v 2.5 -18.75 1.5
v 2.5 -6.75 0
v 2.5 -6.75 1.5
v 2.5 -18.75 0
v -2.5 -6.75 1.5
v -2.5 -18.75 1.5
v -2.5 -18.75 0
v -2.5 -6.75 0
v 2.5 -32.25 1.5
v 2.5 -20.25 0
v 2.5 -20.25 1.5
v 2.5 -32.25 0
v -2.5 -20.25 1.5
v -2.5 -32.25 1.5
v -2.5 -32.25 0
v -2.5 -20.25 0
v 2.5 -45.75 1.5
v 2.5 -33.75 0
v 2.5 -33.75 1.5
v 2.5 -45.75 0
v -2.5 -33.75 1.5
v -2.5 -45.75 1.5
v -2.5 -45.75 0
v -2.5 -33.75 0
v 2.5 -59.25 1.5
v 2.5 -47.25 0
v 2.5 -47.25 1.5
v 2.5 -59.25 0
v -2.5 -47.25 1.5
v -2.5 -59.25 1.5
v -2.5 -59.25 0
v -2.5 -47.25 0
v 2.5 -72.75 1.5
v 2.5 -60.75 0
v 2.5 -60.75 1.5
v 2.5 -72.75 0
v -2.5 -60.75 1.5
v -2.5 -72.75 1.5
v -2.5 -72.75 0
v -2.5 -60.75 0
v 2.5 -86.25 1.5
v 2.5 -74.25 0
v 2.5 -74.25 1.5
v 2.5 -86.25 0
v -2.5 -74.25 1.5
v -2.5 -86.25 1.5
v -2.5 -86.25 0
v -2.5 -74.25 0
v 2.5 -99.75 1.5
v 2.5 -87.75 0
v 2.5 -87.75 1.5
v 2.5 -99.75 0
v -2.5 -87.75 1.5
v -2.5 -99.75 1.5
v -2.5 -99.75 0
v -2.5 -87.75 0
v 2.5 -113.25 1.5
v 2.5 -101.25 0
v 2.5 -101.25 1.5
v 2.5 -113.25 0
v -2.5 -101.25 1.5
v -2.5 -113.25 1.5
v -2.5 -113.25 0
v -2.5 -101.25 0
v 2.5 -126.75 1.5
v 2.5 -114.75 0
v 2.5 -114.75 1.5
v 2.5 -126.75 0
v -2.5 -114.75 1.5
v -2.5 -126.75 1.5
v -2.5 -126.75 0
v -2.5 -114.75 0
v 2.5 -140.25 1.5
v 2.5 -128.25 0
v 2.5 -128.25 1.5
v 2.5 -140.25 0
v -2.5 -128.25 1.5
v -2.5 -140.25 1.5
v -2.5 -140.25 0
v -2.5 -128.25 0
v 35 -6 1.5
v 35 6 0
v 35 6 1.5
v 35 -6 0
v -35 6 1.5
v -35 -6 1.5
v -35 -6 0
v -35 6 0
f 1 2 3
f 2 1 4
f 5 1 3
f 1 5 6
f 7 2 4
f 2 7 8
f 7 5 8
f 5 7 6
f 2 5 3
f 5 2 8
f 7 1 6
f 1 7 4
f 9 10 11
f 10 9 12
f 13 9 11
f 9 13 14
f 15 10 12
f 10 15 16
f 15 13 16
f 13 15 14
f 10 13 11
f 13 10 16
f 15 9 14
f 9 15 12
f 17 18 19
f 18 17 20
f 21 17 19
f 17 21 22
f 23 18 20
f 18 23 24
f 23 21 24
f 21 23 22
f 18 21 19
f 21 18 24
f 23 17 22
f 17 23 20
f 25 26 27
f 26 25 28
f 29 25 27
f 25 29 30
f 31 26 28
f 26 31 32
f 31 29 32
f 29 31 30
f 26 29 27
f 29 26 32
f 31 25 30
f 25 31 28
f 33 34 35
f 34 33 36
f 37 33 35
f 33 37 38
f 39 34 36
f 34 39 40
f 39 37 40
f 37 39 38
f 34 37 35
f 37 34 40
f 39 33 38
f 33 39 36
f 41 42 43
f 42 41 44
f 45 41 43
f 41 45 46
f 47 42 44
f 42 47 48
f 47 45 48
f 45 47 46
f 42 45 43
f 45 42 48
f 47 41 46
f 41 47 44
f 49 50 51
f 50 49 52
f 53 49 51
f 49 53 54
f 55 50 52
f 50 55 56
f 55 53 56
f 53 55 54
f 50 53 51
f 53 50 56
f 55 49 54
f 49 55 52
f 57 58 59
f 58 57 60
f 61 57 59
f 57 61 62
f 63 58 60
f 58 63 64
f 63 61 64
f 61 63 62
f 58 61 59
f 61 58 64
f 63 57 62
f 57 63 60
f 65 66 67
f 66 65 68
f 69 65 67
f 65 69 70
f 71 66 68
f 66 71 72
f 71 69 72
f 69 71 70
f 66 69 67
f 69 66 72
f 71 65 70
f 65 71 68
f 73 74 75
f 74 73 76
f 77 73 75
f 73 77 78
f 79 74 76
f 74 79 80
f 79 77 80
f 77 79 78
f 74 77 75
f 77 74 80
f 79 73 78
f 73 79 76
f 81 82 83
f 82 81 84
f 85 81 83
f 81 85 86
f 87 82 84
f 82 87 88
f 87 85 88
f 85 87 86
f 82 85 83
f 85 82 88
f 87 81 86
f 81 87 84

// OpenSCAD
// Dimensions for 10-well agarose gel comb
$fn = 64;

// Spine (back bar) dimensions
spine_length = 70;   // X direction
spine_width = 12;    // Y direction
spine_thickness = 1.5; // Z direction (height)

// Tooth dimensions
tooth_width = 5.0;   // X direction (width of each tooth)
tooth_length = 12;     // Y direction (length of each tooth, extending from spine)
tooth_gap = 1.5;      // Gap between adjacent teeth (in Y direction)

// Number of teeth
num_teeth = 10;

// The spine is centered at (0, 0, 0) and lies on the bed (z = 0)
// The tooth row is attached to the spine's -Y edge (Y = -spine_width/2 = -6 mm)
// The tooth row extends in the -Y direction from that edge

// Total Y span of the tooth row: 10 teeth × 12 mm + 9 gaps × 1.5 mm = 120 + 13.5 = 133.5 mm
// So the tooth row extends from Y = -6 - 133.5 = -139.5 mm to Y = -6 mm

// The spine is 70 mm long in X, so we center the tooth row in X over the spine
// Each tooth is 5.0 mm wide in X, so we center each tooth at X = 0

// The tooth row is centered in X, so the X center of each tooth is 0
// The Y center of the first tooth is at Y = -6 - tooth_length/2 - tooth_gap/2 = -6 - 6 - 0.75 = -12.75

// But we can compute the Y position of each tooth's center as:
// Y_center = -spine_width/2 - tooth_length/2 - tooth_gap/2 - (tooth_length + tooth_gap) * i

// However, we must ensure the entire comb is properly positioned so that the spine is at z = 0 and the part lies flat on the bed

// The spine is 1.5 mm thick, so we place it at z = 0 to z = 1.5, but the bed is at z = 0
// So we need to ensure the lowest point is at z = 0

// The spine is centered at z = 0, so its bottom is at z = -0.75, top at z = 0.75
// But the bed is at z = 0, so the part is floating — we need to shift it so that the bottom is at z = 0

// Therefore, we translate the entire comb by +0.75 in Z

// Now, the spine will go from z = 0 to z = 1.5, and the comb lies flat on the bed

// Build the comb: start with the spine centered at (0, 0, 0), then shift it up by 0.75 in Z

module comb() {
    // Spine (back bar) — centered at (0, 0, 0), then shifted up
    translate([0, 0, 0.75])
        cube([spine_length, spine_width, spine_thickness], center = true);

    // Add teeth using a loop
    for (i = [0 : num_teeth - 1]) {
        // Y position of this tooth's center
        // The first tooth starts at Y = -spine_width/2 - tooth_length/2 - tooth_gap/2
        // Then each next tooth is offset by (tooth_length + tooth_gap) in Y
        // But we want to center the tooth row in X over the spine
        // So each tooth is centered at X = 0
        // Y center = -spine_width/2 - tooth_length/2 - tooth_gap/2 - (tooth_length + tooth_gap) * i

        // However, the spine is 70 mm long in X, and the tooth is 5.0 mm wide in X
        // So to center the tooth in X, we place it at X = 0
        // But the spine's X is from -35 to 35, so we need to ensure the tooth is within that

        // The tooth is 5.0 mm wide in X, so we center it at X = 0
        // The Y center of the tooth is:
        // Y_center = -spine_width/2 - tooth_length/2 - tooth_gap/2 - (tooth_length + tooth_gap) * i

        // But this would make the tooth row extend from Y = -6 - 6 - 0.75 = -12.75 for the first tooth
        // Then next at Y = -12.75 - (12 + 1.5) = -12.75 - 13.5 = -26.25

        // But the total Y span should be 133.5 mm, so the last tooth should be at Y = -12.75 - 13.5 * 9 = -12.75 - 121.5 = -134.25

        // That matches the report: Y: -134.25 .. 6.00

        // So the Y center of the first tooth is at Y = -6 - 6 - 0.75 = -12.75
        // But we can compute it as:
        // Y_center = -spine_width/2 - tooth_length/2 - tooth_gap/2 - (tooth_length + tooth_gap) * i

        // Actually, we can simplify: the first tooth's Y center is at Y = -spine_width/2 - tooth_length/2 - tooth_gap/2
        // Then subtract (tooth_length + tooth_gap) * i

        // But we can also think: the tooth row is symmetric in X, so we place each tooth centered at X = 0

        // So:
        // X: 0 (centered)
        // Y: -spine_width/2 - tooth_length/2 - tooth_gap/2 - (tooth_length + tooth_gap) * i
        // Z: 0.75 (to lift the bottom to z = 0)

        // But we can do it in one translate

        // Calculate Y center for this tooth
        tooth_y_center = -spine_width/2 - tooth_length/2 - tooth_gap/2 - (tooth_length + tooth_gap) * i;

        // X center is 0 (centered over spine)
        // Z is 0.75 (to lift the bottom to z = 0)

        // But the tooth is 5.0 mm wide in X, so we need to center it at X = 0
        // So we translate to (0, tooth_y_center, 0.75)

        // However, the tooth is 5.0 mm wide in X, so we need to place it so that it's centered at X = 0
        // So we use:
        // translate([0, tooth_y_center, 0.75])
        //   cube([tooth_width, tooth_length, spine_thickness], center = true);

        // But the tooth is 5.0 mm wide in X, so we need to ensure it's centered at X = 0

        // Yes, so:
        translate([0, tooth_y_center, 0.75])
            cube([tooth_width, tooth_length, spine_thickness], center = true);
    }
}

// Render the comb
comb();
